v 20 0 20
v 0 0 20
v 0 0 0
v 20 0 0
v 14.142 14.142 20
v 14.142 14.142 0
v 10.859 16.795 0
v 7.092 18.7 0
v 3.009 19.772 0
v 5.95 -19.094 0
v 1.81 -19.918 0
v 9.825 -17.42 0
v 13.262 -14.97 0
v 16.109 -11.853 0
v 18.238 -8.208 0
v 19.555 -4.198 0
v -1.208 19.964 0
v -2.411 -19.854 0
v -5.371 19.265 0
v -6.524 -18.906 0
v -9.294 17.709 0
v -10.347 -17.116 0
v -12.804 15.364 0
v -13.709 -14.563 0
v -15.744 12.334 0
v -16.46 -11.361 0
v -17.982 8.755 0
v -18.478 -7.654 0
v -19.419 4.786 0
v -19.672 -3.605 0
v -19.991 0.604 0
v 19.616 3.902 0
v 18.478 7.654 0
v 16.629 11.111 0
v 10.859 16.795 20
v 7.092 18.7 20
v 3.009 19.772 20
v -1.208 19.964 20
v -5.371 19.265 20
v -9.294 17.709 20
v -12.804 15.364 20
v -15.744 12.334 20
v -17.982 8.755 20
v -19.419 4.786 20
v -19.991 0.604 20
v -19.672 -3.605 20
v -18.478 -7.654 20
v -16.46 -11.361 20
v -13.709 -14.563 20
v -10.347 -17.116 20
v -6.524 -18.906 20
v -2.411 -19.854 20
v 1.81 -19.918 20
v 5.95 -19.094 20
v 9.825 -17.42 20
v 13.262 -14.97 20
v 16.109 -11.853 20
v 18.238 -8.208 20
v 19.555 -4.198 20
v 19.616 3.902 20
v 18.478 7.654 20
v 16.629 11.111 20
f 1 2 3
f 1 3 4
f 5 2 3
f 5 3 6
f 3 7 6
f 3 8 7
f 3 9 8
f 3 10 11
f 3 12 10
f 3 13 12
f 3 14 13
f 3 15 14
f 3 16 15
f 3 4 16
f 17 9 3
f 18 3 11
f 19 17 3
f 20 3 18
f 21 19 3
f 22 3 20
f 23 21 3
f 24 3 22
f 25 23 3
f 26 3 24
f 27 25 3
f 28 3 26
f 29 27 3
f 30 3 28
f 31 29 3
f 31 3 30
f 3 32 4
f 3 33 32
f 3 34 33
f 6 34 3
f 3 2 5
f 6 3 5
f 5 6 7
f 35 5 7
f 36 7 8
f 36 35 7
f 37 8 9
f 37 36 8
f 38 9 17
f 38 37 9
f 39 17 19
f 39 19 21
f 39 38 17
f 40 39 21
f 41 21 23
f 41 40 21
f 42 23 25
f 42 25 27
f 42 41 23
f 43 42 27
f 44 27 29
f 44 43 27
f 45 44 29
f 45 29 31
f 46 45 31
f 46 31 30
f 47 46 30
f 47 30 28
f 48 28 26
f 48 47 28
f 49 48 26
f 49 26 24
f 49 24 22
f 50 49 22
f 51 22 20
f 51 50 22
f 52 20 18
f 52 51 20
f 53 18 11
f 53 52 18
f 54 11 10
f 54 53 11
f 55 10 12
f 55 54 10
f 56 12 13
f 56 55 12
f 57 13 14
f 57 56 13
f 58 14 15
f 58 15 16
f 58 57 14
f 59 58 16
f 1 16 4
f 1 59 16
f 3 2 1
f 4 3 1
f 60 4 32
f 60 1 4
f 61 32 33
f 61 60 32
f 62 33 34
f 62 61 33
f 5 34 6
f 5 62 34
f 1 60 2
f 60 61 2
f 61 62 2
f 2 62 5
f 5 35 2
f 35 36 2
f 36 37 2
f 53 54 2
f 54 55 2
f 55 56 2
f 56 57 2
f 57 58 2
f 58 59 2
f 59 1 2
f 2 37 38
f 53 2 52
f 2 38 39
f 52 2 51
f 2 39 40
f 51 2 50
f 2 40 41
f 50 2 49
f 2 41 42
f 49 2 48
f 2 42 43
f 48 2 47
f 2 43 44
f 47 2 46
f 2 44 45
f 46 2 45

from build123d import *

# Parameters (mm, degrees)
CYLINDER_W               = 20
CYLINDER_H               = 20
CYLINDER_ANGLE           = 315
CYLINDER_PLACEMENT_ANGLE = 45
CYLINDER001_W            = 20
CYLINDER001_H            = 20
CYLINDER001_ANGLE        = 45


with BuildPart() as base:
    # Cylinder → Cylinder (revolve)
    with BuildSketch(Plane.XZ):
        with Locations((10, 10)):
            Rectangle(CYLINDER_W, CYLINDER_H)
    revolve(axis=Axis((0, 0, 0), (0, 0, 1)), revolution_arc=CYLINDER_ANGLE)


with BuildPart() as base_1:
    # Cylinder placement: moved
    add(base.part.rotate(Axis((0, 0, 0), (0, 0, 1)), CYLINDER_PLACEMENT_ANGLE))


with BuildPart() as proporci:
    # Cylinder001 → Cylinder001 (revolve)
    with BuildSketch(Plane.XZ):
        with Locations((10, 10)):
            Rectangle(CYLINDER001_W, CYLINDER001_H)
    revolve(axis=Axis((0, 0, 0), (0, 0, 1)), revolution_arc=CYLINDER001_ANGLE)


solid = Compound([base_1.part, proporci.part])
